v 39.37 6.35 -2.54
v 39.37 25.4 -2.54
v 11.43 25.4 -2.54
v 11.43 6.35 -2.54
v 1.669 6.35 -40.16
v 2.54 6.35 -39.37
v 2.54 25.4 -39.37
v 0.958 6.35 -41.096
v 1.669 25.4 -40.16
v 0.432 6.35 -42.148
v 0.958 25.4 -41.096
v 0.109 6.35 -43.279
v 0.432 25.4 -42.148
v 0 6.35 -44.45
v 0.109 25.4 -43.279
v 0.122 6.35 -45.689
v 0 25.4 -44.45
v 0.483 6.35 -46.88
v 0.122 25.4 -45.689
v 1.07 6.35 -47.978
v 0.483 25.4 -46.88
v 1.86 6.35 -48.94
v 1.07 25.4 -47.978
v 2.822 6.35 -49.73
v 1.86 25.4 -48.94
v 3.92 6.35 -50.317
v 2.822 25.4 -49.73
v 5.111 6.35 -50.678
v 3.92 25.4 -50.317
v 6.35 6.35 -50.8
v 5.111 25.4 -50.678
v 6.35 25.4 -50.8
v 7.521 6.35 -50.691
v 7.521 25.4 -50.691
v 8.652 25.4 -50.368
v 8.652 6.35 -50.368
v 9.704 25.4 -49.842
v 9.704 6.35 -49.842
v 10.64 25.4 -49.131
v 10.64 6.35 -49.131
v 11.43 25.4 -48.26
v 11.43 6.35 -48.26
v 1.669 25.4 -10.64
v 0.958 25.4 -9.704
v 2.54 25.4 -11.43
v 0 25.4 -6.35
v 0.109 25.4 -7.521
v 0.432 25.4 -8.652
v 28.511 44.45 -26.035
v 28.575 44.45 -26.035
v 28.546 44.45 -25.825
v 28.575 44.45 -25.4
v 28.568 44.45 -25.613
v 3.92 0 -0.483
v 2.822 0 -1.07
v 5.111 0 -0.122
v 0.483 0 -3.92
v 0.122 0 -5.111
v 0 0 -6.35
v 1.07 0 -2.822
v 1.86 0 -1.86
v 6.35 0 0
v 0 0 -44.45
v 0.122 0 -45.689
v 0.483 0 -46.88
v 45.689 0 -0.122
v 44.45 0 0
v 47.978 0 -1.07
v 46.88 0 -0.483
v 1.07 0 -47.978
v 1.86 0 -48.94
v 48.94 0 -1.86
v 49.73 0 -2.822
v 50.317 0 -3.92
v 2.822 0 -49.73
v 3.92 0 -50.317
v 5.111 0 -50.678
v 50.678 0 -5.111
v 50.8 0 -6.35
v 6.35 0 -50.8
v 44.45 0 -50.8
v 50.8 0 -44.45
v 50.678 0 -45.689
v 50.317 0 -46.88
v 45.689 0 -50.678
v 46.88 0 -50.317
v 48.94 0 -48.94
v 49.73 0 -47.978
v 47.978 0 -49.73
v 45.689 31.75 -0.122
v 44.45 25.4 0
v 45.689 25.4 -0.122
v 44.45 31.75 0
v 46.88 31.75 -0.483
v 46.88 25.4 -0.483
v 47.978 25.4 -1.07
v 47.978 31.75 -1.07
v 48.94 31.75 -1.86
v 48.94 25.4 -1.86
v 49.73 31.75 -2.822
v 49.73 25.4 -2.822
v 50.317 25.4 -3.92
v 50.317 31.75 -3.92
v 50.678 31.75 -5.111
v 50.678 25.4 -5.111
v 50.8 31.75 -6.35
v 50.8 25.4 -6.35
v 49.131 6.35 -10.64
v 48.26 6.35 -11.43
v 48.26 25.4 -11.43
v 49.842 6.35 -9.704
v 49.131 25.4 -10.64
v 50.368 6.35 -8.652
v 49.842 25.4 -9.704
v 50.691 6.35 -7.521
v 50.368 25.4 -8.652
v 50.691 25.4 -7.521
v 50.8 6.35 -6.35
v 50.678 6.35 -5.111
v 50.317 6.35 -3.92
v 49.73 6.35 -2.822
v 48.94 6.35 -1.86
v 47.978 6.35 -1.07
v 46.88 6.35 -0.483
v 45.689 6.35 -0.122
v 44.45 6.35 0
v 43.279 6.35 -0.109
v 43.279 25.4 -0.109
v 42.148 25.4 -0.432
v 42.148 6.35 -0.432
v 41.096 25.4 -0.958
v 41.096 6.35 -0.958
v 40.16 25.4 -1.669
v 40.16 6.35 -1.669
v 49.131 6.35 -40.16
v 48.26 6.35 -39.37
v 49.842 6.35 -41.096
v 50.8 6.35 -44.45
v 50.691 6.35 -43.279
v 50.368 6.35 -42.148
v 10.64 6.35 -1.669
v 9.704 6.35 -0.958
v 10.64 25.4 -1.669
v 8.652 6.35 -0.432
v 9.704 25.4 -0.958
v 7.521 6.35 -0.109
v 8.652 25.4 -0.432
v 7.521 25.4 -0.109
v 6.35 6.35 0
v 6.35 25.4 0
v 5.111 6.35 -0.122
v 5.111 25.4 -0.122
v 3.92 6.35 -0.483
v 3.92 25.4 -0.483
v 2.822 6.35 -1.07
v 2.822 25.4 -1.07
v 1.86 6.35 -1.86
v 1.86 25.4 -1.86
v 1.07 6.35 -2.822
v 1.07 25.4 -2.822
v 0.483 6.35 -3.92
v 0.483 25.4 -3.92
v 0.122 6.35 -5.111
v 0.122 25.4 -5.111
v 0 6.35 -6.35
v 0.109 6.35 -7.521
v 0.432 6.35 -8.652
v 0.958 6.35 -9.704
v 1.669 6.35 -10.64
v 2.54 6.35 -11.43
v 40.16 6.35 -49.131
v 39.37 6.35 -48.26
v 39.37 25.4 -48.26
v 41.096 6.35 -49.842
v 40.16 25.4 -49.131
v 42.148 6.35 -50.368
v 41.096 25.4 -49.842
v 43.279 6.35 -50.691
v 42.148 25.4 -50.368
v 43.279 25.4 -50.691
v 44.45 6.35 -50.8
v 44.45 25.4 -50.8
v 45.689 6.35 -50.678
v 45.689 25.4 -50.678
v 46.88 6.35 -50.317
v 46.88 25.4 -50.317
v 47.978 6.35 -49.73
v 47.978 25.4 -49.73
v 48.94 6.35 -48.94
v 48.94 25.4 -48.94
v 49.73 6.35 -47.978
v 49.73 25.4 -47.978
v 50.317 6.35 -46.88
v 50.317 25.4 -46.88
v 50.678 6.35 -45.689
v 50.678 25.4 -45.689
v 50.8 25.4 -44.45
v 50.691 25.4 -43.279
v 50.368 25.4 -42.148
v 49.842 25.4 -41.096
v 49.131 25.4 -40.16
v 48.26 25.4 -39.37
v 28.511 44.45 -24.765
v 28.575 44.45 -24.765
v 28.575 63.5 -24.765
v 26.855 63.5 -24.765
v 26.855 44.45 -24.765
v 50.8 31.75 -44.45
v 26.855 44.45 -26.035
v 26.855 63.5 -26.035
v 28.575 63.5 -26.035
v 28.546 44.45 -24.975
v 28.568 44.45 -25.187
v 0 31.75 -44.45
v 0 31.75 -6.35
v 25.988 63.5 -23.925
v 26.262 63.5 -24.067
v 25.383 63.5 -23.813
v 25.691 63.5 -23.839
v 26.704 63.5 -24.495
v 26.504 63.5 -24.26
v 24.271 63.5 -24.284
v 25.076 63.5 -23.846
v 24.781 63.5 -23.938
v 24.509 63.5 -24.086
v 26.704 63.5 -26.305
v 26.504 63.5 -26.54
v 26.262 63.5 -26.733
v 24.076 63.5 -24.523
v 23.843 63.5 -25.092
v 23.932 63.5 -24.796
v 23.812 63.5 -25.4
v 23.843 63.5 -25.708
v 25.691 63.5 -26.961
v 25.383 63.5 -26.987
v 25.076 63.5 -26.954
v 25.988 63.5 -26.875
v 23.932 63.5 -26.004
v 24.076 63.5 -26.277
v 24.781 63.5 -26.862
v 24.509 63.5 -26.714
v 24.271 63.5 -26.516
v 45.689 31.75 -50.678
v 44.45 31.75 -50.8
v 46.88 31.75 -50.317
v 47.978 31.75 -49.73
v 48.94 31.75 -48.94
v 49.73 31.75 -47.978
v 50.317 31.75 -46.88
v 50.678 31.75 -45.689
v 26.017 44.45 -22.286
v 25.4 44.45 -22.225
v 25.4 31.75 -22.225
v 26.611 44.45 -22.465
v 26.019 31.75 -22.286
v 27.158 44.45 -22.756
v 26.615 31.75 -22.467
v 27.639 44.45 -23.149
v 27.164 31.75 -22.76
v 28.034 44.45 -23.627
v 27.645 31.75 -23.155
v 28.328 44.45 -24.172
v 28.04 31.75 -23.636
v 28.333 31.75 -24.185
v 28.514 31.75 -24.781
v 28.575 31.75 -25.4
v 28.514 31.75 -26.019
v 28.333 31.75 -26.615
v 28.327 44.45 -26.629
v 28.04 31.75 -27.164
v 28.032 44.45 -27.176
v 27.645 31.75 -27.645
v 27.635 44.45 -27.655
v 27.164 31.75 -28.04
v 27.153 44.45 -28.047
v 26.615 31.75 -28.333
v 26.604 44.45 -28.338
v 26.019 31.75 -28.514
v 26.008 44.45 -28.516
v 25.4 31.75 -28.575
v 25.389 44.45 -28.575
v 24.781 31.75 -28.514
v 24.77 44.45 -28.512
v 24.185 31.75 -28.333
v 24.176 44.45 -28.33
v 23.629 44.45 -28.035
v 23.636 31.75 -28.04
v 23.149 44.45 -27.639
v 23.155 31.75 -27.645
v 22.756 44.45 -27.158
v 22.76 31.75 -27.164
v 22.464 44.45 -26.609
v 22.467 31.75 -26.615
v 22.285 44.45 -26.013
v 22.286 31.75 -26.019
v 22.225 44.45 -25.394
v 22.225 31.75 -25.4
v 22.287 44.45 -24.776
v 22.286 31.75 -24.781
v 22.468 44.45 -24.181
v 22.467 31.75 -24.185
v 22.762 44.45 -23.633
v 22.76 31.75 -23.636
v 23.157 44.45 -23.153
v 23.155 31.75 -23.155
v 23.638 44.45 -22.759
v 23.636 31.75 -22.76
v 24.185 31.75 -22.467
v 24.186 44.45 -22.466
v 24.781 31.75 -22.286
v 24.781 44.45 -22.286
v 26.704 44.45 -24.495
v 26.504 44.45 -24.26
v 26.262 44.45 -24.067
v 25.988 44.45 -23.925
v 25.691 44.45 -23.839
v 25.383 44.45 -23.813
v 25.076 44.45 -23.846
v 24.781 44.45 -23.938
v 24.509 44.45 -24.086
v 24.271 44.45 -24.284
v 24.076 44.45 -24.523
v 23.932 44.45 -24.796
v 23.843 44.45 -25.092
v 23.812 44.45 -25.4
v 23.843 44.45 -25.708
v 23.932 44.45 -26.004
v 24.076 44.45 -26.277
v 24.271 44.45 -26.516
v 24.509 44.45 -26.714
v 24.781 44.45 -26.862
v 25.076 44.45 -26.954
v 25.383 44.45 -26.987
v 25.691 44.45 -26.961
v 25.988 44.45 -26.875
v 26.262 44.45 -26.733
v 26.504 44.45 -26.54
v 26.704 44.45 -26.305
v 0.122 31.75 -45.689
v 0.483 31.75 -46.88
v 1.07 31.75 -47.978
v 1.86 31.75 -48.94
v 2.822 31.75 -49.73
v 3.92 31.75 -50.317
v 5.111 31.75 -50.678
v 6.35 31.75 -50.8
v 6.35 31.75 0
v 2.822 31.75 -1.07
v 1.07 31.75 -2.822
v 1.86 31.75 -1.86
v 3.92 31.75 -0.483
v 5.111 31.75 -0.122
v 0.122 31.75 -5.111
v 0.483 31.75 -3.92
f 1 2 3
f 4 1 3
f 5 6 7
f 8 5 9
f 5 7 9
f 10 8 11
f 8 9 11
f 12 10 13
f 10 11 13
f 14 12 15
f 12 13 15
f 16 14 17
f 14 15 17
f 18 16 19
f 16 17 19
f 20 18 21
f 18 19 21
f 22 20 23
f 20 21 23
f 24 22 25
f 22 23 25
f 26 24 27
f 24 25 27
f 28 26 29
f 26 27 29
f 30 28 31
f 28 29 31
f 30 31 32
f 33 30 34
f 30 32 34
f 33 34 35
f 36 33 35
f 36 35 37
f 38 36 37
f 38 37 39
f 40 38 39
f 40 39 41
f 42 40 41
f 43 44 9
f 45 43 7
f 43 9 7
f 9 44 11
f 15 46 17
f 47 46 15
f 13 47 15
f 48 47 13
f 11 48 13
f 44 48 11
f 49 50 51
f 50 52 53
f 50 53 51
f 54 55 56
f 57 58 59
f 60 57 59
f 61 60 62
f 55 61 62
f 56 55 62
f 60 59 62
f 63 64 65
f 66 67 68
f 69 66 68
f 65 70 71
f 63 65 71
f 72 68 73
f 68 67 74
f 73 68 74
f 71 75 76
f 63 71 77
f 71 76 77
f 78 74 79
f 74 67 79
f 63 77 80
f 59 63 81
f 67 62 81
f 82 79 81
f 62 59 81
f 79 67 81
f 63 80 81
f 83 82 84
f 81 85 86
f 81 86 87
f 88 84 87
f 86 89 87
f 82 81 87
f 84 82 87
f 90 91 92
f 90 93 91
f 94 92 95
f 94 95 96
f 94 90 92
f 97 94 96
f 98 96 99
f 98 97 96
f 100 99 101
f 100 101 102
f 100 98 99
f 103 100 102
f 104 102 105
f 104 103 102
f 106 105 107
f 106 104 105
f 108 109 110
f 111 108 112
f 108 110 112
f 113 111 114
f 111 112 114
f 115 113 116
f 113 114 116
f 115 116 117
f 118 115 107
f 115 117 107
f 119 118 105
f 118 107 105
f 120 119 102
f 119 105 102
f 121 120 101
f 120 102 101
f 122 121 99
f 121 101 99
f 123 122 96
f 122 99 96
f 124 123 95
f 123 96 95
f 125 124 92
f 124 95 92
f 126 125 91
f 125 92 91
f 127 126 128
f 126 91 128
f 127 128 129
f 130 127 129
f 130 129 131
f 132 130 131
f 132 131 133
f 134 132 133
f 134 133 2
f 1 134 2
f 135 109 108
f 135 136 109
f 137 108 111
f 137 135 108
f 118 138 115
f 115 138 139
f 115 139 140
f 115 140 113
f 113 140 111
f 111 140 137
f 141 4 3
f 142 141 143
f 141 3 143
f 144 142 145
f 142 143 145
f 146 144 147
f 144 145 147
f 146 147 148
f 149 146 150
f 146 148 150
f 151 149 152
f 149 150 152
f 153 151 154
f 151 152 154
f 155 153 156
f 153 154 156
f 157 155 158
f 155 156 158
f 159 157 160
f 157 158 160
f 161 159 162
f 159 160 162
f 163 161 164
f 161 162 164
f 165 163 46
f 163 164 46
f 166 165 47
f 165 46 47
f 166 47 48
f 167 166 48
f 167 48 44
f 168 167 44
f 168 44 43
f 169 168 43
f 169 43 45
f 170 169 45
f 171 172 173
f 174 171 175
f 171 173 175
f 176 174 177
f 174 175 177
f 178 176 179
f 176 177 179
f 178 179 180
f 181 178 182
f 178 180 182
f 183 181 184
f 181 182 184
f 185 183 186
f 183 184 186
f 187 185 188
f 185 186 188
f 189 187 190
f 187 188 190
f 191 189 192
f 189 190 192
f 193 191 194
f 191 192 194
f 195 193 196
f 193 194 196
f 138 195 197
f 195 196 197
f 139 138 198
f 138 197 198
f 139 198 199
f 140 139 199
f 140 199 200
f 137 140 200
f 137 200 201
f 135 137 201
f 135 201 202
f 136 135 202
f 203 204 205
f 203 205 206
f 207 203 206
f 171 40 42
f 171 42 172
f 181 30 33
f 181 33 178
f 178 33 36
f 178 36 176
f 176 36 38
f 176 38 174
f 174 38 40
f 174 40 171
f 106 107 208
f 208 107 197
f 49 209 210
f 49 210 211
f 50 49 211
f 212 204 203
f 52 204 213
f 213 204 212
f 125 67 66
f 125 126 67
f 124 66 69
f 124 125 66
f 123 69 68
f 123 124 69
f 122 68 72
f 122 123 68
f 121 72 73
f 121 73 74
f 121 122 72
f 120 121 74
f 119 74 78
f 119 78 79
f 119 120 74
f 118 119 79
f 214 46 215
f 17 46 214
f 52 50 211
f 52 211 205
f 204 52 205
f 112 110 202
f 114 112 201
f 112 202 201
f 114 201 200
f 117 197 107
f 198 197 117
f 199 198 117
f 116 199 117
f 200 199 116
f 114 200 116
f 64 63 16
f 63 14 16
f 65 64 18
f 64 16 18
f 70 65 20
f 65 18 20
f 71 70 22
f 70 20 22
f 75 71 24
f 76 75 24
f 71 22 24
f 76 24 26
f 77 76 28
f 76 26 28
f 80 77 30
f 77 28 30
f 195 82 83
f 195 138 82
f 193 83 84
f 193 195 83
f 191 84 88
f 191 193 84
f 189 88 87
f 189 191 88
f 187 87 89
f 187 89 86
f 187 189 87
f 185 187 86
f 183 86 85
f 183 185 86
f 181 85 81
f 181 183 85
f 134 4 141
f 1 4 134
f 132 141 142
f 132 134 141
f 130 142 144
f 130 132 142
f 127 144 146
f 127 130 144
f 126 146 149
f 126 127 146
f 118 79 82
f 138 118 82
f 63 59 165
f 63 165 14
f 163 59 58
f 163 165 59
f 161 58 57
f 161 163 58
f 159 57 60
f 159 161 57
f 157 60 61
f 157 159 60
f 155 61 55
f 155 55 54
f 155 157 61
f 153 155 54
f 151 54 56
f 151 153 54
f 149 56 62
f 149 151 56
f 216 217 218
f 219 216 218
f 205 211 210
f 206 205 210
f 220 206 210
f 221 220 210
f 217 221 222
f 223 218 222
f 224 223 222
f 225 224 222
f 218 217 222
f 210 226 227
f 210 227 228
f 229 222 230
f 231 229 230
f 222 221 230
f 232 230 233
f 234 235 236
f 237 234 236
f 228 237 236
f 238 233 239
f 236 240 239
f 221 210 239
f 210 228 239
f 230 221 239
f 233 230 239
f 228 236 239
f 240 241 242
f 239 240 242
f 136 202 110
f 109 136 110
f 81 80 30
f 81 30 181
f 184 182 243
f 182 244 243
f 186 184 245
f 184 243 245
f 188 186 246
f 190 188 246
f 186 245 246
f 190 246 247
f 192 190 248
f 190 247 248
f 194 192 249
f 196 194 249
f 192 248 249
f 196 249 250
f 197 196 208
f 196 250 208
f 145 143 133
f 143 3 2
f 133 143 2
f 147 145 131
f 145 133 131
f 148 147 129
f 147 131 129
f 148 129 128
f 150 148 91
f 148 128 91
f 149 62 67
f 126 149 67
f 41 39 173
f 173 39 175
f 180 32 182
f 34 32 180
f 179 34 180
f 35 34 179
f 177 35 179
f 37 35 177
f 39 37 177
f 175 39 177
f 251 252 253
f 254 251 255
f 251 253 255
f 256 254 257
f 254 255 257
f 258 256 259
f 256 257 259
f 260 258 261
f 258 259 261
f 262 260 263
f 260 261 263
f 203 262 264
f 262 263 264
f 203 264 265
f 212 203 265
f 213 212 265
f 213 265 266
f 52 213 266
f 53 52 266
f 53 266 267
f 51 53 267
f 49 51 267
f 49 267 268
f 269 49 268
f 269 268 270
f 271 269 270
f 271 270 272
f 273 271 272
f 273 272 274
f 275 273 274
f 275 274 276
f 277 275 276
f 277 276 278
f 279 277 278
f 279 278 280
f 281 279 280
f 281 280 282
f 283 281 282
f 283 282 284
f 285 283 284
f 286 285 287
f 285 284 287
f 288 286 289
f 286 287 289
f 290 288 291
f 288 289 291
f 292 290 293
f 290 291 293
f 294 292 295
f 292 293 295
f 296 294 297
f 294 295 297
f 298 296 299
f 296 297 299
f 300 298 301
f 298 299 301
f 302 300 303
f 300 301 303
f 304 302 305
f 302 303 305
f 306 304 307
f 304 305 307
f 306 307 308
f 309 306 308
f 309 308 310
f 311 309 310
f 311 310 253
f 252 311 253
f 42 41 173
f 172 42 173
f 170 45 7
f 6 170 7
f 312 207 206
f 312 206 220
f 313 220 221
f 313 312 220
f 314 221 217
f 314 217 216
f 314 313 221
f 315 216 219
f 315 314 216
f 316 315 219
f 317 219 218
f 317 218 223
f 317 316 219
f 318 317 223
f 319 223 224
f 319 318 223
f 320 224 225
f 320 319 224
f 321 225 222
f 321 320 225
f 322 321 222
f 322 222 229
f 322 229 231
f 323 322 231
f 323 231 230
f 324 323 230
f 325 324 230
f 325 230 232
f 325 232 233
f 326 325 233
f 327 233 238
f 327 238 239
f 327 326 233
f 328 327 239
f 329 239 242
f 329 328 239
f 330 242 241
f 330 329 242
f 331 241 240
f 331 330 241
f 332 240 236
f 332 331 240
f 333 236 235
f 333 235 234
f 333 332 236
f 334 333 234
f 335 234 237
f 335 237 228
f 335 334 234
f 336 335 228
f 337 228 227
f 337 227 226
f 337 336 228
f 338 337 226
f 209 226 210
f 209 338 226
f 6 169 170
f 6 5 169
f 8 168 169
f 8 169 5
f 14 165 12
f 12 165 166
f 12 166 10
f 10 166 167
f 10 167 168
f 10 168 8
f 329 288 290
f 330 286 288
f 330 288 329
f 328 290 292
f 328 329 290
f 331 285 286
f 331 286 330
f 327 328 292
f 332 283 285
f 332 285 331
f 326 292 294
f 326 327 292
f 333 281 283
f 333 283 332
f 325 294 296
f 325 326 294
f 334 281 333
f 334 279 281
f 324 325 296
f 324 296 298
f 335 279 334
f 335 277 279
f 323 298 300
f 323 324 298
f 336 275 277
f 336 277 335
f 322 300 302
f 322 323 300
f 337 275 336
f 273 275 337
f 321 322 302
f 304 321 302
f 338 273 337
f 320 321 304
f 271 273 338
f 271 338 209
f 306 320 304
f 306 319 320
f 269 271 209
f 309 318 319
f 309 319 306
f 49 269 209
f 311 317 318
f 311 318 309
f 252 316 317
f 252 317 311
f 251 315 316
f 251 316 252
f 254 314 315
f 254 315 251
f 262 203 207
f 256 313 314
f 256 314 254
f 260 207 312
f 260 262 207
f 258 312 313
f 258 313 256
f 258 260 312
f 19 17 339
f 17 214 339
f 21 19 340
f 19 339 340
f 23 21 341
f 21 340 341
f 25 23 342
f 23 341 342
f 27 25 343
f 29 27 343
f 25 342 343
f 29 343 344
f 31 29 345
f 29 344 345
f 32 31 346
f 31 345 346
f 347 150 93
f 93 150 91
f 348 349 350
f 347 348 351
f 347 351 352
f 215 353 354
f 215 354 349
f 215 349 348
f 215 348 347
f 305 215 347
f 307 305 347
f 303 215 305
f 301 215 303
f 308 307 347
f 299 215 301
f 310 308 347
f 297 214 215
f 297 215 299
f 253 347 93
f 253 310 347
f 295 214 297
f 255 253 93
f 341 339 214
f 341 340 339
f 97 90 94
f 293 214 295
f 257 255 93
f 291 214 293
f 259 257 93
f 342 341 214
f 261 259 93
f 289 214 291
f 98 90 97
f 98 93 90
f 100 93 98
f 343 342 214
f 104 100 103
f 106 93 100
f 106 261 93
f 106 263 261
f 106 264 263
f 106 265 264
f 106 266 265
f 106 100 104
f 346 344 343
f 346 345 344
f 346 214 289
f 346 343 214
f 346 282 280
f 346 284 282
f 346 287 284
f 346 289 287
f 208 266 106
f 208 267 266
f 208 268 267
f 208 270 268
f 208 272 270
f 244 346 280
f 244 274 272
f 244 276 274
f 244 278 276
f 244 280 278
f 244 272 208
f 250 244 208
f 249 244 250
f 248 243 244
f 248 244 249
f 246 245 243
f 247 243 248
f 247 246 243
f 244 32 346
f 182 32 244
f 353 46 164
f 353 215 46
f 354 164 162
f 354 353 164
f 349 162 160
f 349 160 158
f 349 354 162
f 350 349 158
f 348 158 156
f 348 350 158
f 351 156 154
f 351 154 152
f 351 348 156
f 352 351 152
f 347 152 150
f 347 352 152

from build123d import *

# Parameters (mm, degrees)
SKETCH1_W           = 50.8
SKETCH1_H           = 50.8
BOSS_EXTRUDE1_DEPTH = 6.35
FILLET1_R           = 6.35
BOSS_EXTRUDE2_START = 19.05
BOSS_EXTRUDE2_DEPTH = 19.05
SKETCH5_W           = 50.8
SKETCH5_H           = 50.8
BOSS_EXTRUDE3_DEPTH = 6.35
FILLET2_R           = 6.35
SKETCH6_R           = 3.175
BOSS_EXTRUDE4_DEPTH = 12.7
BOSS_EXTRUDE5_DEPTH = 19.05


with BuildPart() as part:
    # Sketch1 → Boss-Extrude1 (new body)
    with BuildSketch(Plane(origin=(0, 0, 0), x_dir=(1, 0, 0), z_dir=(0, 1, 0))):
        with Locations((25.4, 25.4)):
            Rectangle(SKETCH1_W, SKETCH1_H)
    extrude(amount=BOSS_EXTRUDE1_DEPTH)

    # Fillet1
    fillet1_edges = [part.edges().sort_by_distance(p)[0] for p in [
        (0, 3.175, -50.8),
        (50.8, 3.175, -50.8),
        (50.8, 3.175, 0),
        (0, 3.175, 0),
    ]]
    fillet(fillet1_edges, radius=FILLET1_R)

    # Sketch3 → Boss-Extrude2 (add)
    with BuildSketch(Plane(origin=(0, 6.35, 0), x_dir=(1, 0, 0), z_dir=(0, 1, 0)).offset(BOSS_EXTRUDE2_START)):
        with BuildLine():
            Line((11.43, 48.26), (39.37, 48.26))
            ThreePointArc((39.37, 48.26), (48.940128061, 48.940128061), (48.26, 39.37))
            Line((48.26, 39.37), (48.26, 11.43))
            ThreePointArc((48.26, 11.43), (48.940128061, 1.859871939), (39.37, 2.54))
            Line((39.37, 2.54), (11.43, 2.54))
            ThreePointArc((11.43, 2.54), (1.859871939, 1.859871939), (2.54, 11.43))
            Line((2.54, 11.43), (2.54, 39.37))
            ThreePointArc((2.54, 39.37), (1.859871939, 48.940128061), (11.43, 48.26))
        make_face()
    extrude(amount=-BOSS_EXTRUDE2_DEPTH)

    # Sketch5 → Boss-Extrude3 (add)
    with BuildSketch(Plane(origin=(0, 25.4, 0), x_dir=(1, 0, 0), z_dir=(0, 1, 0))):
        with Locations((25.4, 25.4)):
            Rectangle(SKETCH5_W, SKETCH5_H)
    extrude(amount=BOSS_EXTRUDE3_DEPTH)

    # Fillet2
    fillet2_edges = [part.edges().sort_by_distance(p)[0] for p in [
        (50.8, 28.575, -50.8),
        (0, 28.575, -50.8),
        (50.8, 28.575, 0),
        (0, 28.575, 0),
    ]]
    fillet(fillet2_edges, radius=FILLET2_R - 0.0001)  # a hair under: the kernel refuses the full size

    # Sketch6 → Boss-Extrude4 (add)
    with BuildSketch(Plane(origin=(0, 31.75, 0), x_dir=(1, 0, 0), z_dir=(0, 1, 0))):
        with Locations(Location((25.4, 25.4, 0), (0, 0, 270))):
            Circle(SKETCH6_R)
    extrude(amount=BOSS_EXTRUDE4_DEPTH)

    # Sketch7 → Boss-Extrude5 (add)
    with BuildSketch(Plane(origin=(0, 44.45, 0), x_dir=(1, 0, 0), z_dir=(0, 1, 0))):
        with BuildLine():
            Line((28.575, 26.035), (28.575, 24.765))
            Line((28.575, 24.765), (26.854967783, 24.765))
            ThreePointArc((26.854967783, 24.765), (23.8125, 25.4), (26.854967783, 26.035))
            Line((26.854967783, 26.035), (28.575, 26.035))
        make_face()
    extrude(amount=BOSS_EXTRUDE5_DEPTH)


solid = part.part
